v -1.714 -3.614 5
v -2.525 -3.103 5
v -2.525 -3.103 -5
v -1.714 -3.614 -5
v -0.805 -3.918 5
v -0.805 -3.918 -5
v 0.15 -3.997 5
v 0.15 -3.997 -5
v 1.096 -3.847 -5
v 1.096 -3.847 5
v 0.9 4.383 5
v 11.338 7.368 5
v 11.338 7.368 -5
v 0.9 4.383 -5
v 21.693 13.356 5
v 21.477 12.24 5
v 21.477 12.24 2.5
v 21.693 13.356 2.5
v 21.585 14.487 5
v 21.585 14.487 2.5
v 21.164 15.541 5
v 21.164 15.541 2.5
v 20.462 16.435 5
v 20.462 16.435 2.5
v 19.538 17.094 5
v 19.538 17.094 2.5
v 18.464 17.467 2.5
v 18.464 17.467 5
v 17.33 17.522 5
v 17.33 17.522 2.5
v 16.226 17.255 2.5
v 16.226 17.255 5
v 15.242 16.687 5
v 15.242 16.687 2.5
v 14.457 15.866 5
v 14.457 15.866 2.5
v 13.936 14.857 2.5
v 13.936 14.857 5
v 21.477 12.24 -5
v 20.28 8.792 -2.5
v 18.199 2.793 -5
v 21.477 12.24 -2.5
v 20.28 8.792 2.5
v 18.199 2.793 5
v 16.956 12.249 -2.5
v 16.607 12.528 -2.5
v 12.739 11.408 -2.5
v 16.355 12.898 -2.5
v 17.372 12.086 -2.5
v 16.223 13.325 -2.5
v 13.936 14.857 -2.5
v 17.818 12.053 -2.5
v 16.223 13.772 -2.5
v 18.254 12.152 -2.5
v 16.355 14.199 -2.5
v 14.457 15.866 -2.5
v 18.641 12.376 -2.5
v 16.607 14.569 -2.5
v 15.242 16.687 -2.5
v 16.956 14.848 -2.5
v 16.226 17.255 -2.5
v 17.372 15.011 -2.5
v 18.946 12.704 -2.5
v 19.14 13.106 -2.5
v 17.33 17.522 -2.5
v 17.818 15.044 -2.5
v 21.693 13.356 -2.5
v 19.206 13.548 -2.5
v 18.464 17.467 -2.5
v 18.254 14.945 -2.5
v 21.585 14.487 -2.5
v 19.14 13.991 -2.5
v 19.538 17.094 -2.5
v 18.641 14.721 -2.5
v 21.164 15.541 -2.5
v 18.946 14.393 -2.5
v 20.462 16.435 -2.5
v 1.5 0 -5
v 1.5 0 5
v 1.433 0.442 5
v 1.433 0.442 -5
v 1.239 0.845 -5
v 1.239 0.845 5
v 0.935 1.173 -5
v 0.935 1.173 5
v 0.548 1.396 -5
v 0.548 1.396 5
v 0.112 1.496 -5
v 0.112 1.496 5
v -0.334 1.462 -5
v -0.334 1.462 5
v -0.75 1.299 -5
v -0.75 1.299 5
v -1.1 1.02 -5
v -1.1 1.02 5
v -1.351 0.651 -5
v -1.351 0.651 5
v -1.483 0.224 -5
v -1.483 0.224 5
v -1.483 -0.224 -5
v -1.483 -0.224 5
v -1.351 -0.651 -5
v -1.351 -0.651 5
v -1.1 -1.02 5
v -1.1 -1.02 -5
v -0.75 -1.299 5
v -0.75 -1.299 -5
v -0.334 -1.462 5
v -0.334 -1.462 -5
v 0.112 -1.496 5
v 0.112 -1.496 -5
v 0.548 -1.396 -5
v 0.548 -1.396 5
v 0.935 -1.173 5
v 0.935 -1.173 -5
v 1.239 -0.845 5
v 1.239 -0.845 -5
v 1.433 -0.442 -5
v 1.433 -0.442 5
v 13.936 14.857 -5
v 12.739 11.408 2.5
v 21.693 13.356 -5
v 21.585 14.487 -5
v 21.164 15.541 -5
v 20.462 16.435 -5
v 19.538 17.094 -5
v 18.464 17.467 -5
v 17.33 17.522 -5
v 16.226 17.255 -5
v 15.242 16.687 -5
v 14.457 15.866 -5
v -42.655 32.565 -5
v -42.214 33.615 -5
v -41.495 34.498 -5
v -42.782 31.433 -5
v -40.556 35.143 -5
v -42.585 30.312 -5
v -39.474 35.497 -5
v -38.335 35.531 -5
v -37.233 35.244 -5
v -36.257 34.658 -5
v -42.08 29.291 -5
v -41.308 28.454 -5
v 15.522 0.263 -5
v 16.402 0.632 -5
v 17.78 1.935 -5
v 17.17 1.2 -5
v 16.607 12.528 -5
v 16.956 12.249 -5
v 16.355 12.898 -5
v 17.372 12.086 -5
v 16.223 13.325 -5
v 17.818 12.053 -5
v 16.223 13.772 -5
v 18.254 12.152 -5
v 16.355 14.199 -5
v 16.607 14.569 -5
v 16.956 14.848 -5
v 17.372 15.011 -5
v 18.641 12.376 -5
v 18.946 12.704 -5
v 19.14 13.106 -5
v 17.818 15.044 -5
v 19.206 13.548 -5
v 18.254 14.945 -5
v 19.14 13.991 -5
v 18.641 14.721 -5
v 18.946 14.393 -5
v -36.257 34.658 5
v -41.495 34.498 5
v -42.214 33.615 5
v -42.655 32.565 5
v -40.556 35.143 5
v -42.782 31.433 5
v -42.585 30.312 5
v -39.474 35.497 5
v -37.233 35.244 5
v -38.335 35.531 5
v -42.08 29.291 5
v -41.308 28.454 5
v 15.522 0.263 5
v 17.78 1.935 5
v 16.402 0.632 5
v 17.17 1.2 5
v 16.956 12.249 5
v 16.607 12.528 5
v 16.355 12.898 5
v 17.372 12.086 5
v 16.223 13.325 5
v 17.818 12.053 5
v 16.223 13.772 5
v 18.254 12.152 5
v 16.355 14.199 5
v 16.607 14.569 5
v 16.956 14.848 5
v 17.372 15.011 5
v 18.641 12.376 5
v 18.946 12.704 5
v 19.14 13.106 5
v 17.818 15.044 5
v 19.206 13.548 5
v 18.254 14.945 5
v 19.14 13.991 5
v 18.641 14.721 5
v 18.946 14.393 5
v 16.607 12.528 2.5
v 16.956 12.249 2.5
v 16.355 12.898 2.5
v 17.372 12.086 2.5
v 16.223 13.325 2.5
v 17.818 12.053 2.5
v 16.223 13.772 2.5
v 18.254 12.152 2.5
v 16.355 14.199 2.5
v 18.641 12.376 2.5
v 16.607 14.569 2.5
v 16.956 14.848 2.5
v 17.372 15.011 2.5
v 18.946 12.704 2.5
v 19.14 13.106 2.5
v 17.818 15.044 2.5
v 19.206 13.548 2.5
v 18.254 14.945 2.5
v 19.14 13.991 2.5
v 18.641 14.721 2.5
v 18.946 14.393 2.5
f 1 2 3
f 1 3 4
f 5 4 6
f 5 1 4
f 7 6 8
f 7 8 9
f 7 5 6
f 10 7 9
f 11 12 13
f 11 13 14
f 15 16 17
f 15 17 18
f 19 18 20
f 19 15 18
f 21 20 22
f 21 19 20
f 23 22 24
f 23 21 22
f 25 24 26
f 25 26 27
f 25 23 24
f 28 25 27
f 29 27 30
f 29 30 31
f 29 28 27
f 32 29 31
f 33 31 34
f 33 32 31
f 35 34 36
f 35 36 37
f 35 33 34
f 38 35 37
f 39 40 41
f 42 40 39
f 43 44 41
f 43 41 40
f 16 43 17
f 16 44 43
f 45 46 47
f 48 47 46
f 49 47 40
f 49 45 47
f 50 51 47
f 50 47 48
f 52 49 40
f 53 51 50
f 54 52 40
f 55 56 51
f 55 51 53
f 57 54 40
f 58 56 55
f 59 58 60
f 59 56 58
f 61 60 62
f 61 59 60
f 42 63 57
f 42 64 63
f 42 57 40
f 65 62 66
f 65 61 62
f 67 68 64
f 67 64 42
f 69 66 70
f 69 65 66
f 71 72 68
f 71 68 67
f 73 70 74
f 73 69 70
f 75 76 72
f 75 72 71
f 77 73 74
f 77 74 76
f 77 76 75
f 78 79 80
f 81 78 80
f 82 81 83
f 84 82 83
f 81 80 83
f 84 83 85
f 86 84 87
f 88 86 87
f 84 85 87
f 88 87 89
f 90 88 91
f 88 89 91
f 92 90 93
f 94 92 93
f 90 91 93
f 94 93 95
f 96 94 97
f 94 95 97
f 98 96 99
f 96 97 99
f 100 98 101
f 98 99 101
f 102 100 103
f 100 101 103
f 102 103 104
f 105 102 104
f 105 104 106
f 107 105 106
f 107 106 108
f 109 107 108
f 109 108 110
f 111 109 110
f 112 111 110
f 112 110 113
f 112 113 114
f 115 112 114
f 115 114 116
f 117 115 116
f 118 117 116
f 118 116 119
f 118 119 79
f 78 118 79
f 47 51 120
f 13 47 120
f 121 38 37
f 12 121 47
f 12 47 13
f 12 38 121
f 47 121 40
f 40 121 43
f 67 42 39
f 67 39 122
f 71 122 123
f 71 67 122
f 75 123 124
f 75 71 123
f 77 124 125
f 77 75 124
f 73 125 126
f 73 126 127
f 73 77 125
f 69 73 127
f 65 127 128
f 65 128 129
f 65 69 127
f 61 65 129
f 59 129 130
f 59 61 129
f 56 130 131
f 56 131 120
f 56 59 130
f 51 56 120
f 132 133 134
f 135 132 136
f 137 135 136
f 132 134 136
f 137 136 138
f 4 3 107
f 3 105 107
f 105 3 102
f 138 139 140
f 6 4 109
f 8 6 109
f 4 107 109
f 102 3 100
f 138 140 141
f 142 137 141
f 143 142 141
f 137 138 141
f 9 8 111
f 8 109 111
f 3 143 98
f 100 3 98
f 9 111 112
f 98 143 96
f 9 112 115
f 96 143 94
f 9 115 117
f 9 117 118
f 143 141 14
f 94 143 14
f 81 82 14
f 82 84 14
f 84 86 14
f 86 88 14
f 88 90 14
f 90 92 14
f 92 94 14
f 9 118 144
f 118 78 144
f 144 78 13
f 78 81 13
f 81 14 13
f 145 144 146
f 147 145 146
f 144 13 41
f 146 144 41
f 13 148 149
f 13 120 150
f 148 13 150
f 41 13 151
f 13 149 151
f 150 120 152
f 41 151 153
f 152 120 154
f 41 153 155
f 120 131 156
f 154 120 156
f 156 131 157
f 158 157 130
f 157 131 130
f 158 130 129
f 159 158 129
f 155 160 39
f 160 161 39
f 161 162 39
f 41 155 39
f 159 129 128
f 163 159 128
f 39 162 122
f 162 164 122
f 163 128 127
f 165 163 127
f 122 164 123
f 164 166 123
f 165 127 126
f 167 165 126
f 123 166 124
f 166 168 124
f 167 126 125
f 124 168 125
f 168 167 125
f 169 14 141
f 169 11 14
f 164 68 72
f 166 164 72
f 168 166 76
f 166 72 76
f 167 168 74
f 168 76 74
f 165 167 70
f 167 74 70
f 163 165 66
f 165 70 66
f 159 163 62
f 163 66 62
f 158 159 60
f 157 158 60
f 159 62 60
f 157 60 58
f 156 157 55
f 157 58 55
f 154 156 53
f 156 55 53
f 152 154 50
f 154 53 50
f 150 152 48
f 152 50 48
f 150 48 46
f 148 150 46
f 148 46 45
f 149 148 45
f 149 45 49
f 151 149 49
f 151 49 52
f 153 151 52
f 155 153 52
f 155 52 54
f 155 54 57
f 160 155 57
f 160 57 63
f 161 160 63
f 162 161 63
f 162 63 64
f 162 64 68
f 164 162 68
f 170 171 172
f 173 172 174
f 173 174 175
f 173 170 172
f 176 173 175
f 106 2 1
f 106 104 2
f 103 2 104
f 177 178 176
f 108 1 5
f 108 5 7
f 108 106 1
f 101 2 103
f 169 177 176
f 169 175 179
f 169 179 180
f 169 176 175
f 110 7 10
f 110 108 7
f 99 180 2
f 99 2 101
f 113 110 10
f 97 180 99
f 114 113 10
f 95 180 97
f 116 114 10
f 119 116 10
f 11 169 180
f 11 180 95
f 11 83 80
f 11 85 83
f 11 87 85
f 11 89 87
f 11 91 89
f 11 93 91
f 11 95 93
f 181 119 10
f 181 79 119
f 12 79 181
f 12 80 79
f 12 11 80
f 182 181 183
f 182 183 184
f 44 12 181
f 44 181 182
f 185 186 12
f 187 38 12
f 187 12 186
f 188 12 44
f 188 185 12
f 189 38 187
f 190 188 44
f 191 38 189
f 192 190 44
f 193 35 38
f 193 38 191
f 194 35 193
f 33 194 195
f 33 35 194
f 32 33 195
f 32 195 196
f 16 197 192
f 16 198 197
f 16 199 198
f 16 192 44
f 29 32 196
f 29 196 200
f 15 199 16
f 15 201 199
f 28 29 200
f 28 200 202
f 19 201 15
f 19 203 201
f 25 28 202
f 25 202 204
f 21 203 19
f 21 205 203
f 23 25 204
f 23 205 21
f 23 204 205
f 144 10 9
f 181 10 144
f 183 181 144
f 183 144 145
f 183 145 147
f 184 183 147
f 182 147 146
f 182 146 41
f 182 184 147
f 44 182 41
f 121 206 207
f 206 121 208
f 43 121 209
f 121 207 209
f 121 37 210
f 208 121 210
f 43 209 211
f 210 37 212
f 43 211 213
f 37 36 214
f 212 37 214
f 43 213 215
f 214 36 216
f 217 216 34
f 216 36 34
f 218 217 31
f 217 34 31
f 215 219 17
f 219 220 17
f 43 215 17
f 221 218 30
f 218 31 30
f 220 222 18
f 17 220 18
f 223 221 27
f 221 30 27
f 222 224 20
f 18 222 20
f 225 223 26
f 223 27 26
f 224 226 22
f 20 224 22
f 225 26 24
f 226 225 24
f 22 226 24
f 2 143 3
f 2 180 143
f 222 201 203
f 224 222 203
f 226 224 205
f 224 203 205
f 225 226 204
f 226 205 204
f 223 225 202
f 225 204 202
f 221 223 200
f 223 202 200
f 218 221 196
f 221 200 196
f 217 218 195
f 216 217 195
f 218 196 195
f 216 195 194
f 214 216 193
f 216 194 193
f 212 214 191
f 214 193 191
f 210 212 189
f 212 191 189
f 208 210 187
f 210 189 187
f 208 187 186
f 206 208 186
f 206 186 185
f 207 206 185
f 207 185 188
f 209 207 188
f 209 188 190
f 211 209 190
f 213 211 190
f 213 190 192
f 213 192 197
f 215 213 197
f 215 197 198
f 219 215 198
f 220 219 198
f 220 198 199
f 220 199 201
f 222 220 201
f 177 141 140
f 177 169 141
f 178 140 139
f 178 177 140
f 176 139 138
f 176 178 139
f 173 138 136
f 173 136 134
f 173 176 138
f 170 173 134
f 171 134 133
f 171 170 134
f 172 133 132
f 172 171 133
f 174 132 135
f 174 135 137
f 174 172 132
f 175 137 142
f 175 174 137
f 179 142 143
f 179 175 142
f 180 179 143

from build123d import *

# Parameters (mm, degrees)
Y_KSEKLIK_EKSTR_ZYON1_DEPTH = 5
IZIM2_R                     = 1.5
KES_EKSTR_ZYON1_DEPTH       = 15
KES_EKSTR_ZYON2_DEPTH       = 2.5


with BuildPart() as part:
    # Çizim1 → Yükseklik-Ekstrüzyon1 (new, symmetric)
    with BuildSketch(Plane.XY):
        with BuildLine():
            Line((-41.30834423, 28.453834486), (-2.524523213, -3.102705681))
            ThreePointArc((-2.524523213, -3.102705681), (-0.805425984, -3.9180721), (1.095904798, -3.846945889))
            Line((1.095904798, -3.846945889), (15.52194925, 0.262696355))
            ThreePointArc((15.52194925, 0.262696355), (17.169826346, 1.200432935), (18.198993637, 2.792809619))
            Line((18.198993637, 2.792809619), (21.476713619, 12.240378181))
            ThreePointArc((21.476713619, 12.240378181), (19.014364959, 17.318962653), (13.935780486, 14.856613993))
            Line((13.935780486, 14.856613993), (11.337646141, 7.367855803))
            Line((11.337646141, 7.367855803), (0.900459327, 4.382653193))
            Line((0.900459327, 4.382653193), (-36.257215818, 34.657550675))
            ThreePointArc((-36.257215818, 34.657550675), (-41.885679286, 34.082104516), (-41.30834423, 28.453834486))
        make_face()
    extrude(amount=Y_KSEKLIK_EKSTR_ZYON1_DEPTH, both=True)

    # Çizim2 → Kes-Ekstrüzyon1 (cut)
    with BuildSketch(Plane.XY.offset(5)):
        with Locations((17.706247053, 13.548496087)):
            Circle(IZIM2_R)
        Circle(IZIM2_R)
    extrude(amount=-KES_EKSTR_ZYON1_DEPTH, mode=Mode.SUBTRACT)

    # Çizim3 → Kes-Ekstrüzyon2 (cut, symmetric)
    with BuildSketch(Plane.XY):
        with BuildLine():
            Line((12.739401972, 11.408220568), (20.280335105, 8.791984755))
            Line((20.280335105, 8.791984755), (21.476713619, 12.240378181))
            ThreePointArc((21.476713619, 12.240378181), (19.014364959, 17.318962653), (13.935780486, 14.856613993))
            Line((13.935780486, 14.856613993), (12.739401972, 11.408220568))
        make_face()
    extrude(amount=KES_EKSTR_ZYON2_DEPTH, both=True, mode=Mode.SUBTRACT)


solid = part.part
